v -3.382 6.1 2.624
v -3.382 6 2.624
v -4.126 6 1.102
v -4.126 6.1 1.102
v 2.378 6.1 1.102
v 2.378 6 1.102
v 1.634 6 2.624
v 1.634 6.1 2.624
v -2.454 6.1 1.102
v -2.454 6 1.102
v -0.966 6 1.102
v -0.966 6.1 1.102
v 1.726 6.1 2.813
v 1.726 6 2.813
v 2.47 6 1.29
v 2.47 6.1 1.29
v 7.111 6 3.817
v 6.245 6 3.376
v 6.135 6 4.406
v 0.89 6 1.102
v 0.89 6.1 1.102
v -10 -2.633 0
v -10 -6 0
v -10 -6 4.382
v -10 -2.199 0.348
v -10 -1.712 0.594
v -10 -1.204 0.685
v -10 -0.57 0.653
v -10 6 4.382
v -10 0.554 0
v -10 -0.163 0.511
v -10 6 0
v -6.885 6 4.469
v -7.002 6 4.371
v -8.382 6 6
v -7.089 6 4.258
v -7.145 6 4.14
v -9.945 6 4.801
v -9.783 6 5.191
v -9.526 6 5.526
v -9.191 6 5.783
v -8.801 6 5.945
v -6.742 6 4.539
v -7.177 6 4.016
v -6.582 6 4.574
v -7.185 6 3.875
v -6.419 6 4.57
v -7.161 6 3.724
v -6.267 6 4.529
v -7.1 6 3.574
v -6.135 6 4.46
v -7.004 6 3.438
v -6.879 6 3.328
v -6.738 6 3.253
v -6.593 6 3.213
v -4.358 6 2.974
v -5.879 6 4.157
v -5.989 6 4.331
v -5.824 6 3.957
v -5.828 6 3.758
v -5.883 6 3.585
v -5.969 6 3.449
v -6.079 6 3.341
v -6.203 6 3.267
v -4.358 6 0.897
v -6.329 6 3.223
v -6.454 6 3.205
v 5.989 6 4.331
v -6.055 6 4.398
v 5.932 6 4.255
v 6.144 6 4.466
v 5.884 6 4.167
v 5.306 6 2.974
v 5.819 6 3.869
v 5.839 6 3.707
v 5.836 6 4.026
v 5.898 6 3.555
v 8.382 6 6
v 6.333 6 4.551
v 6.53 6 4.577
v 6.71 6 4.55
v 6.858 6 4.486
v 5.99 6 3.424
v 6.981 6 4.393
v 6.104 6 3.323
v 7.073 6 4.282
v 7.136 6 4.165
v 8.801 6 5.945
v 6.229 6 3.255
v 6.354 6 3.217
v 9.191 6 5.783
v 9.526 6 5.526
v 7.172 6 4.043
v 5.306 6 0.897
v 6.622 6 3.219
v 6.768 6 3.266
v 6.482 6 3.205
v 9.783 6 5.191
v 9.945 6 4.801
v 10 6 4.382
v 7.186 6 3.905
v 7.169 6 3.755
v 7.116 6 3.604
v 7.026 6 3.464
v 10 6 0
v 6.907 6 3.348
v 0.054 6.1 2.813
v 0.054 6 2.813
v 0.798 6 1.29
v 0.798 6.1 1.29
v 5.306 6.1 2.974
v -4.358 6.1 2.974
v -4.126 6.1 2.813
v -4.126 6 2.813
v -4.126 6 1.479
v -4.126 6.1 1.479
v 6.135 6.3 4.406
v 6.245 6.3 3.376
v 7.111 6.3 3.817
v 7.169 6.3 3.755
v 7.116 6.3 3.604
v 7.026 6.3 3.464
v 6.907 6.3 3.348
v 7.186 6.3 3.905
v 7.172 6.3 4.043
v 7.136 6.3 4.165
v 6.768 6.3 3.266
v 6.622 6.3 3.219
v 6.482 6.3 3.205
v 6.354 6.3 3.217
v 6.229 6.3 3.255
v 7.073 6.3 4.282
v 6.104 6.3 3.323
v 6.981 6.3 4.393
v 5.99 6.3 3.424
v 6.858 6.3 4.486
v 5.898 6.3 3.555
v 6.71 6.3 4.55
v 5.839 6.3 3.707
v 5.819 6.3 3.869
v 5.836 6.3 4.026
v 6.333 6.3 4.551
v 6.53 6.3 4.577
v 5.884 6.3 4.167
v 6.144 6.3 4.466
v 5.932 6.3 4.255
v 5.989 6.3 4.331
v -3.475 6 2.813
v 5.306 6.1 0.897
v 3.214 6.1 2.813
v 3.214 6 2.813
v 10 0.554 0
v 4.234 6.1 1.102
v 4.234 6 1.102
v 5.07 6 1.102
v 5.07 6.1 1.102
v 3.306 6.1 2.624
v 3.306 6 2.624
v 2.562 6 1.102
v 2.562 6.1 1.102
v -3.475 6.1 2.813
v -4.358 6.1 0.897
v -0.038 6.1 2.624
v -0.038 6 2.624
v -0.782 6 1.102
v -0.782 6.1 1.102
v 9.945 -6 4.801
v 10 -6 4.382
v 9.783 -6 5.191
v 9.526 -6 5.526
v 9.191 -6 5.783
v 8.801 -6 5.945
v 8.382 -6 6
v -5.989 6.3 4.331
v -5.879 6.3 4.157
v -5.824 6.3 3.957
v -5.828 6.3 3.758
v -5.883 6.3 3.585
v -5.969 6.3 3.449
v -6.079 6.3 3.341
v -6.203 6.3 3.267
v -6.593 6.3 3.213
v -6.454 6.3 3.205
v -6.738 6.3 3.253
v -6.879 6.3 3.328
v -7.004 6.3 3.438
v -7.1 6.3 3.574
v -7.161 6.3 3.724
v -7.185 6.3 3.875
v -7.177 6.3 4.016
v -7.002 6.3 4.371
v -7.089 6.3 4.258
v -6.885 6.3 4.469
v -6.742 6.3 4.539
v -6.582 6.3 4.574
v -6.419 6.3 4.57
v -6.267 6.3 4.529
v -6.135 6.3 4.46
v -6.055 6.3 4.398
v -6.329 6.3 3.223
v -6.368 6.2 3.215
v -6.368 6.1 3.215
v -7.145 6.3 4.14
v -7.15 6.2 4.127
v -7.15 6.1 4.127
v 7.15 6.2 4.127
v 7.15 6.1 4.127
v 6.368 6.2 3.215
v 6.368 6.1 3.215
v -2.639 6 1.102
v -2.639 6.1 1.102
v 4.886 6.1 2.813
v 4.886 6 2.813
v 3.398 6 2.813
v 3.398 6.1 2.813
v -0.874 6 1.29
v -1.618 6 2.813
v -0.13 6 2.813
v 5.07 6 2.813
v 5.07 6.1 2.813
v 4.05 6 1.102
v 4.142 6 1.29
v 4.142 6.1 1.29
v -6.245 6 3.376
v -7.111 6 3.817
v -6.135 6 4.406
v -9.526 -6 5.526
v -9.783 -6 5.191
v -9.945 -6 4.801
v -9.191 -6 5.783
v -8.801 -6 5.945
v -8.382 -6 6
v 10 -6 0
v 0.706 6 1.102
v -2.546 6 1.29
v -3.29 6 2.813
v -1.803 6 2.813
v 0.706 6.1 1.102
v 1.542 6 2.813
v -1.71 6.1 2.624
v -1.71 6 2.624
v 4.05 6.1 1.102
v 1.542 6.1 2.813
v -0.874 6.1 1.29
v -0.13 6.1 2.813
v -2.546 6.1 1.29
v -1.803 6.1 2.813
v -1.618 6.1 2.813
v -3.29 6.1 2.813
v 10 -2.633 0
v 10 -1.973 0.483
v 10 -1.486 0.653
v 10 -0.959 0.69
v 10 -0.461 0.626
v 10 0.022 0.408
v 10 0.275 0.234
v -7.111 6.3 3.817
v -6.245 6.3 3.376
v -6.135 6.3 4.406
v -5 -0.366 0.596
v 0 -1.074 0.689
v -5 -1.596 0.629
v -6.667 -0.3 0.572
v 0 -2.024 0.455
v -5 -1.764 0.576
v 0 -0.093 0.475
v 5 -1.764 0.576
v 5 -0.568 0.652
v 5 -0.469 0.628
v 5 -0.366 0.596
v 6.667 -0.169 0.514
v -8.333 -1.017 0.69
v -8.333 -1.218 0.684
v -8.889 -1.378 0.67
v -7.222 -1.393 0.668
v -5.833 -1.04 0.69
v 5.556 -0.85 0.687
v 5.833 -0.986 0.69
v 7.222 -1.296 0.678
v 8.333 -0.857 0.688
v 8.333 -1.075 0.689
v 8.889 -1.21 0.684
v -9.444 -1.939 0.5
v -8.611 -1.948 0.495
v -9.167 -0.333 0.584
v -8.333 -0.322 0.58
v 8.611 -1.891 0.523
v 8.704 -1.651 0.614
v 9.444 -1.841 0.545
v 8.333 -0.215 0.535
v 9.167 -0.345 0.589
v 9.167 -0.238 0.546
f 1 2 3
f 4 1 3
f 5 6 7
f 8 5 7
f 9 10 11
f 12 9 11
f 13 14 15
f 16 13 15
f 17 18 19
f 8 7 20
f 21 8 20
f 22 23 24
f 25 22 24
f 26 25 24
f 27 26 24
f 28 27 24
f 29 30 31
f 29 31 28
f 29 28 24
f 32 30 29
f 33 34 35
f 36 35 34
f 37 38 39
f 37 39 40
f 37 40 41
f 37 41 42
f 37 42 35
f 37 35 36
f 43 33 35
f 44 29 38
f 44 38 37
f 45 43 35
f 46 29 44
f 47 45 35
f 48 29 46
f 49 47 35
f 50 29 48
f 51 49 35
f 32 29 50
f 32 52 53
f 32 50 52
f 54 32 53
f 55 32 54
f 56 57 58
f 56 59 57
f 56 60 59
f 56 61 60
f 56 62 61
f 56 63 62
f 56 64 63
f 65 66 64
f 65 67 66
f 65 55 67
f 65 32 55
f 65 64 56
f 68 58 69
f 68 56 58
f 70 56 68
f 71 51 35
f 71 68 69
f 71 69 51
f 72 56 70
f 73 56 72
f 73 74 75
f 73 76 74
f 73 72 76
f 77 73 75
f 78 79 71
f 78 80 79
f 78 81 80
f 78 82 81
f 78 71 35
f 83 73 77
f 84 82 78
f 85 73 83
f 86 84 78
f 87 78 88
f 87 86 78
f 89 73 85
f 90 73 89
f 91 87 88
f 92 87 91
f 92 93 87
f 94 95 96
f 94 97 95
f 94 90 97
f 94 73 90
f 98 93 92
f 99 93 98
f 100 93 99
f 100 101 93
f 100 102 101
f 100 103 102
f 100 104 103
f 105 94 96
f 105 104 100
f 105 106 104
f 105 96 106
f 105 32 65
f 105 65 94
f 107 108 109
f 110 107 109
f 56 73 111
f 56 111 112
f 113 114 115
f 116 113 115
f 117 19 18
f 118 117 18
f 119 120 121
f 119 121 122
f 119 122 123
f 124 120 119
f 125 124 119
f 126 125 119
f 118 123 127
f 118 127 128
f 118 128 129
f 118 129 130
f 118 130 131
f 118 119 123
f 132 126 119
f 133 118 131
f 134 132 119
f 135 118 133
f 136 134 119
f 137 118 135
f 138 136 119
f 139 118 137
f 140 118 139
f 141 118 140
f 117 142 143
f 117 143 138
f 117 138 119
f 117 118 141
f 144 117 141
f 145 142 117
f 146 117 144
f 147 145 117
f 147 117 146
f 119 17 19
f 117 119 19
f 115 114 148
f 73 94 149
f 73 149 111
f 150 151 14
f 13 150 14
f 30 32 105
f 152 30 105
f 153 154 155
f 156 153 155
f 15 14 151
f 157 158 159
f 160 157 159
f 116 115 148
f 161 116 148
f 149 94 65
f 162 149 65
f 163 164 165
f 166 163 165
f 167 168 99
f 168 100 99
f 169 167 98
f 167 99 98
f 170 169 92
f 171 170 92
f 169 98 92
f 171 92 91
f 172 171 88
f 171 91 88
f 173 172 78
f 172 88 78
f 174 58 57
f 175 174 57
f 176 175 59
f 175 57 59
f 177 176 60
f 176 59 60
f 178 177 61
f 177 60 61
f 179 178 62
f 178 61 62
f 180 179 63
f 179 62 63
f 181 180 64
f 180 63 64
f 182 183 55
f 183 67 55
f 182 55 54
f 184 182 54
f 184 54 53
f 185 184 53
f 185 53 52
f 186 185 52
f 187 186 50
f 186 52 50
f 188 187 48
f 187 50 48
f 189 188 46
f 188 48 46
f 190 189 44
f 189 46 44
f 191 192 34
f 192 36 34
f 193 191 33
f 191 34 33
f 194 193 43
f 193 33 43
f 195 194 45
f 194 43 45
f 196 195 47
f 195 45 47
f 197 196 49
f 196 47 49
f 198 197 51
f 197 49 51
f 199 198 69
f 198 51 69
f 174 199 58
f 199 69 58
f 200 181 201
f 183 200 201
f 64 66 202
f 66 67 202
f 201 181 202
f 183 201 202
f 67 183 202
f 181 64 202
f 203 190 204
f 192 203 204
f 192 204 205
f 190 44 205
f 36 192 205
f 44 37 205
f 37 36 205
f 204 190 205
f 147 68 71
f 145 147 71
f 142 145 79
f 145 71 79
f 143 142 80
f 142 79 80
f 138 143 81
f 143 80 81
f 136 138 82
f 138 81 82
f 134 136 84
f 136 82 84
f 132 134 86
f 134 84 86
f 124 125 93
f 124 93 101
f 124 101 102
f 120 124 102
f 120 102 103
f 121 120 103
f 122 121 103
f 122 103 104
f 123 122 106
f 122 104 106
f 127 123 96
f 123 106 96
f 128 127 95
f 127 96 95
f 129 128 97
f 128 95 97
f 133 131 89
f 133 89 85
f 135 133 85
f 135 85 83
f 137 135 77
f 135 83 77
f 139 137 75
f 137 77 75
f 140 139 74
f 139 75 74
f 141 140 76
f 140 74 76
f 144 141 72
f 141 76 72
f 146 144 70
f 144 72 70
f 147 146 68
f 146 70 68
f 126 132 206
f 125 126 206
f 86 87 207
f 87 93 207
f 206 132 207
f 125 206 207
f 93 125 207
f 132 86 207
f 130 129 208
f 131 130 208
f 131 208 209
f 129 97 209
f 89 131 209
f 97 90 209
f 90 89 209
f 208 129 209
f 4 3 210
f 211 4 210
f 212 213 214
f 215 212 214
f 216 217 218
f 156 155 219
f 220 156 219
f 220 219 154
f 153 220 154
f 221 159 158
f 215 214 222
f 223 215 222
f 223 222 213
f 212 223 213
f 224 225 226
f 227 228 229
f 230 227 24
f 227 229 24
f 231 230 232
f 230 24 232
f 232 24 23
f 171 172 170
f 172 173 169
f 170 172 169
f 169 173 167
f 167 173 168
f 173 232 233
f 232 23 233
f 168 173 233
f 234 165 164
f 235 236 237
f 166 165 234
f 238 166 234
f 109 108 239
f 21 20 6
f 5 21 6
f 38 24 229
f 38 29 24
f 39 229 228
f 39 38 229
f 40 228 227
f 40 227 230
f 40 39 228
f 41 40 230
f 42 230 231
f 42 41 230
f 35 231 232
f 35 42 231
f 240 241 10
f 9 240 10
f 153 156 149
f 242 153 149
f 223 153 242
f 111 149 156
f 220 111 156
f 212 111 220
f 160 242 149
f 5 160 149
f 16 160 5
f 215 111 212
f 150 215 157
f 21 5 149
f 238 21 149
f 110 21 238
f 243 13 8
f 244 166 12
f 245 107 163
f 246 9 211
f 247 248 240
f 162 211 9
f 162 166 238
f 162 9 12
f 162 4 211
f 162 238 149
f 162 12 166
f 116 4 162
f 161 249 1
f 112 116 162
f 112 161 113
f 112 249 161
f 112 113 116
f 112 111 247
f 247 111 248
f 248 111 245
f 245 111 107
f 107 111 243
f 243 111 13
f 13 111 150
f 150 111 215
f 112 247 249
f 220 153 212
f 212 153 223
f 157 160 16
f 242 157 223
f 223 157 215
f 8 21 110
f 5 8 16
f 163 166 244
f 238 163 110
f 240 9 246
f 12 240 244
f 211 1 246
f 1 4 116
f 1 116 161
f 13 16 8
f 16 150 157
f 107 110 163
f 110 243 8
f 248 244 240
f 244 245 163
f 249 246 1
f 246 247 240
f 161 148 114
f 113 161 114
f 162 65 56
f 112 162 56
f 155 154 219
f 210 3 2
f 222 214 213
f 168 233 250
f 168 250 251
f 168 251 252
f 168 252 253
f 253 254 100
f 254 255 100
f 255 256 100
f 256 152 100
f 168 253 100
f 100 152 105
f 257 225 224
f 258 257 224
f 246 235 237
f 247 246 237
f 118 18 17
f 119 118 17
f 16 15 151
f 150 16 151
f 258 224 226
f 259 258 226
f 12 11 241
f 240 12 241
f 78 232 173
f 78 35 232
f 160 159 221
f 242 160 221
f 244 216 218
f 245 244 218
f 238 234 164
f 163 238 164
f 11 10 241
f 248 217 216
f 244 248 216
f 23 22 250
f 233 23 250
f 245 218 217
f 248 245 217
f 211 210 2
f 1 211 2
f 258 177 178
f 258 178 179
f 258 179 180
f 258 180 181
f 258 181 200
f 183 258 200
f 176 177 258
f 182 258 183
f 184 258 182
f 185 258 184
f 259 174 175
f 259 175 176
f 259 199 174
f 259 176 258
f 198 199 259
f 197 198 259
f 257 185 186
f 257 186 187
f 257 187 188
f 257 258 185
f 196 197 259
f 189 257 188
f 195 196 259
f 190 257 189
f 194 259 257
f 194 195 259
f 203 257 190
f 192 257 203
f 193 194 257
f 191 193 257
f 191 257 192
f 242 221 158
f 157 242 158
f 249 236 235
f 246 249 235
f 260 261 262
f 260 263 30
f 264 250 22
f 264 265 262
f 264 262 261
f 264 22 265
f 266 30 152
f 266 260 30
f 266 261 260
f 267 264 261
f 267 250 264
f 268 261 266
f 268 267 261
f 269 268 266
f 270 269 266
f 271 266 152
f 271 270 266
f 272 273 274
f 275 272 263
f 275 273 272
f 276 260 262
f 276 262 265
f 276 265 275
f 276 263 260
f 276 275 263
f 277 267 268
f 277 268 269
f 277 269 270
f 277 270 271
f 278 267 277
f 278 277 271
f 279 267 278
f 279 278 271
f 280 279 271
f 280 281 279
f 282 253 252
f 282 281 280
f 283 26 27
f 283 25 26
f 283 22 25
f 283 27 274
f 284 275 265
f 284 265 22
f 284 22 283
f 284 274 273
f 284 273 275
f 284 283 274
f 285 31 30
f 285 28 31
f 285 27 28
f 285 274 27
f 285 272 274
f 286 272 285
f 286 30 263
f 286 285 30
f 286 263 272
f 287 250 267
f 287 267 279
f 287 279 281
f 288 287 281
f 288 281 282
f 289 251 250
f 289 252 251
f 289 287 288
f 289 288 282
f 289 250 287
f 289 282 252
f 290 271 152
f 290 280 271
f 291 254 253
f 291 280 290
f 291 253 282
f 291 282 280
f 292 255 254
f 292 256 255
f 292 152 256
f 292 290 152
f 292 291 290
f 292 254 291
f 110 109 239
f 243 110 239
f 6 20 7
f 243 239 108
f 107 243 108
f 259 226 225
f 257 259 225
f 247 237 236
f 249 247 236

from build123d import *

# Parameters (mm, degrees)
F0_W     = 20
F0_H     = 12
F1_DEPTH = 6
F2_R     = 1.6175230868
F4_DEPTH = 0.3
F5_W     = 9.6640973352
F5_H     = 2.0774973091
F6_DEPTH = 0.1
F8_DEPTH = 25


with BuildPart() as f1:
    # F0 (on Top) → F1 (new body)
    with BuildSketch(Plane.XY):
        Rectangle(F0_W, F0_H)
    extrude(amount=F1_DEPTH)

    # F2
    f2_edges = [f1.edges().sort_by_distance(p)[0] for p in [
        (10, 0, 6),
        (-10, 0, 6),
    ]]
    fillet(f2_edges, radius=F2_R)

    # F3 (on face) → F4 (join)
    with BuildSketch(Plane(origin=(0, 6, 0), x_dir=(-1, 0, 0), z_dir=(0, 1, 0))):
        with BuildLine():
            add(Edge.make_bspline(
                [(-5.9889552958, 4.3307738066), (-6.7707574457, 5.2428768765), (-7.1497281936, 4.126935614), (-7.5286989414, 3.0109943515), (-6.3679260436, 3.2148325442), (-5.2071531458, 3.4186707368), (-5.9889552958, 4.3307738066)],
                knots=[4.7123889804, 4.7123889804, 4.7123889804, 6.8067840828, 6.8067840828, 8.9011791852, 8.9011791852, 10.9955742876, 10.9955742876, 10.9955742876], degree=2, weights=[1, 0.5, 1, 0.5, 1, 0.5, 1]))
        make_face()
        Polygon((-7.1114664897, 3.8173154462), (-6.1345444992, 4.4055692852), (-6.2445141857, 3.376125358), align=None, mode=Mode.SUBTRACT)
        with BuildLine():
            add(Edge.make_bspline(
                [(5.9889552958, 4.3307738066), (5.2071531458, 3.4186707368), (6.3679260436, 3.2148325442), (7.5286989414, 3.0109943515), (7.1497281936, 4.126935614), (6.7707574457, 5.2428768765), (5.9889552958, 4.3307738066)],
                knots=[4.7123889804, 4.7123889804, 4.7123889804, 6.8067840828, 6.8067840828, 8.9011791852, 8.9011791852, 10.9955742876, 10.9955742876, 10.9955742876], degree=2, weights=[1, 0.5, 1, 0.5, 1, 0.5, 1]))
        make_face()
        Polygon((6.1345444992, 4.4055692852), (7.1114664897, 3.8173154462), (6.2445141857, 3.376125358), align=None, mode=Mode.SUBTRACT)
    extrude(amount=F4_DEPTH)

    # F5 (on face) → F6 (join)
    with BuildSketch(Plane(origin=(0, 6, 0), x_dir=(-1, 0, 0), z_dir=(0, 1, 0))):
        with Locations((-0.4735698458, 1.9353075186)):
            Rectangle(F5_W, F5_H)
        Polygon((-5.069738923, 1.1018711375), (-5.069738923, 2.8125192574), (-4.8855133355, 2.8125192574), (-3.3977353226, 2.8125192574), (-3.2135097351, 2.8125192574), (-1.7257317222, 2.8125192574), (-1.5415061347, 2.8125192574), (-0.0537281219, 2.8125192574), (0.1304974656, 2.8125192574), (1.6182754785, 2.8125192574), (1.802501066, 2.8125192574), (3.2902790789, 2.8125192574), (3.4745046664, 2.8125192574), (4.1262808791, 2.8125192574), (4.1262808791, 1.4788382144), (4.1262808791, 1.1018711375), (2.6385028662, 1.1018711375), (2.4542772787, 1.1018711375), (0.9664992658, 1.1018711375), (0.7822736783, 1.1018711375), (-0.7055043345, 1.1018711375), (-0.889729922, 1.1018711375), (-2.3775079349, 1.1018711375), (-2.5617335224, 1.1018711375), (-4.0495115353, 1.1018711375), (-4.2337371228, 1.1018711375), align=None, mode=Mode.SUBTRACT)
        Polygon((-4.8855133355, 2.8125192574), (-5.069738923, 2.8125192574), (-4.2337371228, 1.1018711375), (-4.141624329, 1.2903546759), align=None)
        Polygon((-3.3056225288, 2.624035719), (-3.3977353226, 2.8125192574), (-4.141624329, 1.2903546759), (-4.0495115353, 1.1018711375), align=None)
        Polygon((-2.4696207287, 1.2903546759), (-3.2135097351, 2.8125192574), (-3.3056225288, 2.624035719), (-2.5617335224, 1.1018711375), align=None)
        Polygon((-1.6336189285, 2.624035719), (-1.7257317222, 2.8125192574), (-2.4696207287, 1.2903546759), (-2.3775079349, 1.1018711375), align=None)
        Polygon((-0.7976171283, 1.2903546759), (-1.5415061347, 2.8125192574), (-1.6336189285, 2.624035719), (-0.889729922, 1.1018711375), align=None)
        Polygon((0.0383846719, 2.624035719), (-0.0537281219, 2.8125192574), (-0.7976171283, 1.2903546759), (-0.7055043345, 1.1018711375), align=None)
        Polygon((0.8743864721, 1.2903546759), (0.1304974656, 2.8125192574), (0.0383846719, 2.624035719), (0.7822736783, 1.1018711375), align=None)
        Polygon((1.7103882723, 2.624035719), (1.6182754785, 2.8125192574), (0.8743864721, 1.2903546759), (0.9664992658, 1.1018711375), align=None)
        Polygon((2.5463900724, 1.2903546759), (1.802501066, 2.8125192574), (1.7103882723, 2.624035719), (2.4542772787, 1.1018711375), align=None)
        Polygon((3.3823918726, 2.624035719), (3.2902790789, 2.8125192574), (2.5463900724, 1.2903546759), (2.6385028662, 1.1018711375), align=None)
        Polygon((4.1262808791, 1.4788382144), (3.4745046664, 2.8125192574), (3.3823918726, 2.624035719), (4.1262808791, 1.1018711375), align=None)
        Polygon((-4.141624329, 1.2903546759), (-4.2337371228, 1.1018711375), (-4.0495115353, 1.1018711375), align=None)
        Polygon((-3.2135097351, 2.8125192574), (-3.3977353226, 2.8125192574), (-3.3056225288, 2.624035719), align=None)
        Polygon((-2.4696207287, 1.2903546759), (-2.5617335224, 1.1018711375), (-2.3775079349, 1.1018711375), align=None)
        Polygon((-1.5415061347, 2.8125192574), (-1.7257317222, 2.8125192574), (-1.6336189285, 2.624035719), align=None)
        Polygon((-0.7976171283, 1.2903546759), (-0.889729922, 1.1018711375), (-0.7055043345, 1.1018711375), align=None)
        Polygon((0.1304974656, 2.8125192574), (-0.0537281219, 2.8125192574), (0.0383846719, 2.624035719), align=None)
        Polygon((0.8743864721, 1.2903546759), (0.7822736783, 1.1018711375), (0.9664992658, 1.1018711375), align=None)
        Polygon((1.802501066, 2.8125192574), (1.6182754785, 2.8125192574), (1.7103882723, 2.624035719), align=None)
        Polygon((2.5463900724, 1.2903546759), (2.4542772787, 1.1018711375), (2.6385028662, 1.1018711375), align=None)
        Polygon((3.4745046664, 2.8125192574), (3.2902790789, 2.8125192574), (3.3823918726, 2.624035719), align=None)
    extrude(amount=F6_DEPTH)

    # F7 (on face) → F8 (cut)
    with BuildSketch(Plane.YZ.offset(10)):
        with BuildLine():
            add(Edge.make_bspline(
                [(-2.6326957159, 0), (-1.952913386, 0.6265651125), (-1.0674622337, 0.7346938286), (-0.1766542916, 0.661617056), (0.5543848965, 0)],
                knots=[0, 0, 0, 0, 0.4953425033, 1, 1, 1, 1], degree=3))
            Line((-2.6326957159, 0), (0.5543848965, 0))
        make_face()
    extrude(amount=-F8_DEPTH, mode=Mode.SUBTRACT)


solid = f1.part
